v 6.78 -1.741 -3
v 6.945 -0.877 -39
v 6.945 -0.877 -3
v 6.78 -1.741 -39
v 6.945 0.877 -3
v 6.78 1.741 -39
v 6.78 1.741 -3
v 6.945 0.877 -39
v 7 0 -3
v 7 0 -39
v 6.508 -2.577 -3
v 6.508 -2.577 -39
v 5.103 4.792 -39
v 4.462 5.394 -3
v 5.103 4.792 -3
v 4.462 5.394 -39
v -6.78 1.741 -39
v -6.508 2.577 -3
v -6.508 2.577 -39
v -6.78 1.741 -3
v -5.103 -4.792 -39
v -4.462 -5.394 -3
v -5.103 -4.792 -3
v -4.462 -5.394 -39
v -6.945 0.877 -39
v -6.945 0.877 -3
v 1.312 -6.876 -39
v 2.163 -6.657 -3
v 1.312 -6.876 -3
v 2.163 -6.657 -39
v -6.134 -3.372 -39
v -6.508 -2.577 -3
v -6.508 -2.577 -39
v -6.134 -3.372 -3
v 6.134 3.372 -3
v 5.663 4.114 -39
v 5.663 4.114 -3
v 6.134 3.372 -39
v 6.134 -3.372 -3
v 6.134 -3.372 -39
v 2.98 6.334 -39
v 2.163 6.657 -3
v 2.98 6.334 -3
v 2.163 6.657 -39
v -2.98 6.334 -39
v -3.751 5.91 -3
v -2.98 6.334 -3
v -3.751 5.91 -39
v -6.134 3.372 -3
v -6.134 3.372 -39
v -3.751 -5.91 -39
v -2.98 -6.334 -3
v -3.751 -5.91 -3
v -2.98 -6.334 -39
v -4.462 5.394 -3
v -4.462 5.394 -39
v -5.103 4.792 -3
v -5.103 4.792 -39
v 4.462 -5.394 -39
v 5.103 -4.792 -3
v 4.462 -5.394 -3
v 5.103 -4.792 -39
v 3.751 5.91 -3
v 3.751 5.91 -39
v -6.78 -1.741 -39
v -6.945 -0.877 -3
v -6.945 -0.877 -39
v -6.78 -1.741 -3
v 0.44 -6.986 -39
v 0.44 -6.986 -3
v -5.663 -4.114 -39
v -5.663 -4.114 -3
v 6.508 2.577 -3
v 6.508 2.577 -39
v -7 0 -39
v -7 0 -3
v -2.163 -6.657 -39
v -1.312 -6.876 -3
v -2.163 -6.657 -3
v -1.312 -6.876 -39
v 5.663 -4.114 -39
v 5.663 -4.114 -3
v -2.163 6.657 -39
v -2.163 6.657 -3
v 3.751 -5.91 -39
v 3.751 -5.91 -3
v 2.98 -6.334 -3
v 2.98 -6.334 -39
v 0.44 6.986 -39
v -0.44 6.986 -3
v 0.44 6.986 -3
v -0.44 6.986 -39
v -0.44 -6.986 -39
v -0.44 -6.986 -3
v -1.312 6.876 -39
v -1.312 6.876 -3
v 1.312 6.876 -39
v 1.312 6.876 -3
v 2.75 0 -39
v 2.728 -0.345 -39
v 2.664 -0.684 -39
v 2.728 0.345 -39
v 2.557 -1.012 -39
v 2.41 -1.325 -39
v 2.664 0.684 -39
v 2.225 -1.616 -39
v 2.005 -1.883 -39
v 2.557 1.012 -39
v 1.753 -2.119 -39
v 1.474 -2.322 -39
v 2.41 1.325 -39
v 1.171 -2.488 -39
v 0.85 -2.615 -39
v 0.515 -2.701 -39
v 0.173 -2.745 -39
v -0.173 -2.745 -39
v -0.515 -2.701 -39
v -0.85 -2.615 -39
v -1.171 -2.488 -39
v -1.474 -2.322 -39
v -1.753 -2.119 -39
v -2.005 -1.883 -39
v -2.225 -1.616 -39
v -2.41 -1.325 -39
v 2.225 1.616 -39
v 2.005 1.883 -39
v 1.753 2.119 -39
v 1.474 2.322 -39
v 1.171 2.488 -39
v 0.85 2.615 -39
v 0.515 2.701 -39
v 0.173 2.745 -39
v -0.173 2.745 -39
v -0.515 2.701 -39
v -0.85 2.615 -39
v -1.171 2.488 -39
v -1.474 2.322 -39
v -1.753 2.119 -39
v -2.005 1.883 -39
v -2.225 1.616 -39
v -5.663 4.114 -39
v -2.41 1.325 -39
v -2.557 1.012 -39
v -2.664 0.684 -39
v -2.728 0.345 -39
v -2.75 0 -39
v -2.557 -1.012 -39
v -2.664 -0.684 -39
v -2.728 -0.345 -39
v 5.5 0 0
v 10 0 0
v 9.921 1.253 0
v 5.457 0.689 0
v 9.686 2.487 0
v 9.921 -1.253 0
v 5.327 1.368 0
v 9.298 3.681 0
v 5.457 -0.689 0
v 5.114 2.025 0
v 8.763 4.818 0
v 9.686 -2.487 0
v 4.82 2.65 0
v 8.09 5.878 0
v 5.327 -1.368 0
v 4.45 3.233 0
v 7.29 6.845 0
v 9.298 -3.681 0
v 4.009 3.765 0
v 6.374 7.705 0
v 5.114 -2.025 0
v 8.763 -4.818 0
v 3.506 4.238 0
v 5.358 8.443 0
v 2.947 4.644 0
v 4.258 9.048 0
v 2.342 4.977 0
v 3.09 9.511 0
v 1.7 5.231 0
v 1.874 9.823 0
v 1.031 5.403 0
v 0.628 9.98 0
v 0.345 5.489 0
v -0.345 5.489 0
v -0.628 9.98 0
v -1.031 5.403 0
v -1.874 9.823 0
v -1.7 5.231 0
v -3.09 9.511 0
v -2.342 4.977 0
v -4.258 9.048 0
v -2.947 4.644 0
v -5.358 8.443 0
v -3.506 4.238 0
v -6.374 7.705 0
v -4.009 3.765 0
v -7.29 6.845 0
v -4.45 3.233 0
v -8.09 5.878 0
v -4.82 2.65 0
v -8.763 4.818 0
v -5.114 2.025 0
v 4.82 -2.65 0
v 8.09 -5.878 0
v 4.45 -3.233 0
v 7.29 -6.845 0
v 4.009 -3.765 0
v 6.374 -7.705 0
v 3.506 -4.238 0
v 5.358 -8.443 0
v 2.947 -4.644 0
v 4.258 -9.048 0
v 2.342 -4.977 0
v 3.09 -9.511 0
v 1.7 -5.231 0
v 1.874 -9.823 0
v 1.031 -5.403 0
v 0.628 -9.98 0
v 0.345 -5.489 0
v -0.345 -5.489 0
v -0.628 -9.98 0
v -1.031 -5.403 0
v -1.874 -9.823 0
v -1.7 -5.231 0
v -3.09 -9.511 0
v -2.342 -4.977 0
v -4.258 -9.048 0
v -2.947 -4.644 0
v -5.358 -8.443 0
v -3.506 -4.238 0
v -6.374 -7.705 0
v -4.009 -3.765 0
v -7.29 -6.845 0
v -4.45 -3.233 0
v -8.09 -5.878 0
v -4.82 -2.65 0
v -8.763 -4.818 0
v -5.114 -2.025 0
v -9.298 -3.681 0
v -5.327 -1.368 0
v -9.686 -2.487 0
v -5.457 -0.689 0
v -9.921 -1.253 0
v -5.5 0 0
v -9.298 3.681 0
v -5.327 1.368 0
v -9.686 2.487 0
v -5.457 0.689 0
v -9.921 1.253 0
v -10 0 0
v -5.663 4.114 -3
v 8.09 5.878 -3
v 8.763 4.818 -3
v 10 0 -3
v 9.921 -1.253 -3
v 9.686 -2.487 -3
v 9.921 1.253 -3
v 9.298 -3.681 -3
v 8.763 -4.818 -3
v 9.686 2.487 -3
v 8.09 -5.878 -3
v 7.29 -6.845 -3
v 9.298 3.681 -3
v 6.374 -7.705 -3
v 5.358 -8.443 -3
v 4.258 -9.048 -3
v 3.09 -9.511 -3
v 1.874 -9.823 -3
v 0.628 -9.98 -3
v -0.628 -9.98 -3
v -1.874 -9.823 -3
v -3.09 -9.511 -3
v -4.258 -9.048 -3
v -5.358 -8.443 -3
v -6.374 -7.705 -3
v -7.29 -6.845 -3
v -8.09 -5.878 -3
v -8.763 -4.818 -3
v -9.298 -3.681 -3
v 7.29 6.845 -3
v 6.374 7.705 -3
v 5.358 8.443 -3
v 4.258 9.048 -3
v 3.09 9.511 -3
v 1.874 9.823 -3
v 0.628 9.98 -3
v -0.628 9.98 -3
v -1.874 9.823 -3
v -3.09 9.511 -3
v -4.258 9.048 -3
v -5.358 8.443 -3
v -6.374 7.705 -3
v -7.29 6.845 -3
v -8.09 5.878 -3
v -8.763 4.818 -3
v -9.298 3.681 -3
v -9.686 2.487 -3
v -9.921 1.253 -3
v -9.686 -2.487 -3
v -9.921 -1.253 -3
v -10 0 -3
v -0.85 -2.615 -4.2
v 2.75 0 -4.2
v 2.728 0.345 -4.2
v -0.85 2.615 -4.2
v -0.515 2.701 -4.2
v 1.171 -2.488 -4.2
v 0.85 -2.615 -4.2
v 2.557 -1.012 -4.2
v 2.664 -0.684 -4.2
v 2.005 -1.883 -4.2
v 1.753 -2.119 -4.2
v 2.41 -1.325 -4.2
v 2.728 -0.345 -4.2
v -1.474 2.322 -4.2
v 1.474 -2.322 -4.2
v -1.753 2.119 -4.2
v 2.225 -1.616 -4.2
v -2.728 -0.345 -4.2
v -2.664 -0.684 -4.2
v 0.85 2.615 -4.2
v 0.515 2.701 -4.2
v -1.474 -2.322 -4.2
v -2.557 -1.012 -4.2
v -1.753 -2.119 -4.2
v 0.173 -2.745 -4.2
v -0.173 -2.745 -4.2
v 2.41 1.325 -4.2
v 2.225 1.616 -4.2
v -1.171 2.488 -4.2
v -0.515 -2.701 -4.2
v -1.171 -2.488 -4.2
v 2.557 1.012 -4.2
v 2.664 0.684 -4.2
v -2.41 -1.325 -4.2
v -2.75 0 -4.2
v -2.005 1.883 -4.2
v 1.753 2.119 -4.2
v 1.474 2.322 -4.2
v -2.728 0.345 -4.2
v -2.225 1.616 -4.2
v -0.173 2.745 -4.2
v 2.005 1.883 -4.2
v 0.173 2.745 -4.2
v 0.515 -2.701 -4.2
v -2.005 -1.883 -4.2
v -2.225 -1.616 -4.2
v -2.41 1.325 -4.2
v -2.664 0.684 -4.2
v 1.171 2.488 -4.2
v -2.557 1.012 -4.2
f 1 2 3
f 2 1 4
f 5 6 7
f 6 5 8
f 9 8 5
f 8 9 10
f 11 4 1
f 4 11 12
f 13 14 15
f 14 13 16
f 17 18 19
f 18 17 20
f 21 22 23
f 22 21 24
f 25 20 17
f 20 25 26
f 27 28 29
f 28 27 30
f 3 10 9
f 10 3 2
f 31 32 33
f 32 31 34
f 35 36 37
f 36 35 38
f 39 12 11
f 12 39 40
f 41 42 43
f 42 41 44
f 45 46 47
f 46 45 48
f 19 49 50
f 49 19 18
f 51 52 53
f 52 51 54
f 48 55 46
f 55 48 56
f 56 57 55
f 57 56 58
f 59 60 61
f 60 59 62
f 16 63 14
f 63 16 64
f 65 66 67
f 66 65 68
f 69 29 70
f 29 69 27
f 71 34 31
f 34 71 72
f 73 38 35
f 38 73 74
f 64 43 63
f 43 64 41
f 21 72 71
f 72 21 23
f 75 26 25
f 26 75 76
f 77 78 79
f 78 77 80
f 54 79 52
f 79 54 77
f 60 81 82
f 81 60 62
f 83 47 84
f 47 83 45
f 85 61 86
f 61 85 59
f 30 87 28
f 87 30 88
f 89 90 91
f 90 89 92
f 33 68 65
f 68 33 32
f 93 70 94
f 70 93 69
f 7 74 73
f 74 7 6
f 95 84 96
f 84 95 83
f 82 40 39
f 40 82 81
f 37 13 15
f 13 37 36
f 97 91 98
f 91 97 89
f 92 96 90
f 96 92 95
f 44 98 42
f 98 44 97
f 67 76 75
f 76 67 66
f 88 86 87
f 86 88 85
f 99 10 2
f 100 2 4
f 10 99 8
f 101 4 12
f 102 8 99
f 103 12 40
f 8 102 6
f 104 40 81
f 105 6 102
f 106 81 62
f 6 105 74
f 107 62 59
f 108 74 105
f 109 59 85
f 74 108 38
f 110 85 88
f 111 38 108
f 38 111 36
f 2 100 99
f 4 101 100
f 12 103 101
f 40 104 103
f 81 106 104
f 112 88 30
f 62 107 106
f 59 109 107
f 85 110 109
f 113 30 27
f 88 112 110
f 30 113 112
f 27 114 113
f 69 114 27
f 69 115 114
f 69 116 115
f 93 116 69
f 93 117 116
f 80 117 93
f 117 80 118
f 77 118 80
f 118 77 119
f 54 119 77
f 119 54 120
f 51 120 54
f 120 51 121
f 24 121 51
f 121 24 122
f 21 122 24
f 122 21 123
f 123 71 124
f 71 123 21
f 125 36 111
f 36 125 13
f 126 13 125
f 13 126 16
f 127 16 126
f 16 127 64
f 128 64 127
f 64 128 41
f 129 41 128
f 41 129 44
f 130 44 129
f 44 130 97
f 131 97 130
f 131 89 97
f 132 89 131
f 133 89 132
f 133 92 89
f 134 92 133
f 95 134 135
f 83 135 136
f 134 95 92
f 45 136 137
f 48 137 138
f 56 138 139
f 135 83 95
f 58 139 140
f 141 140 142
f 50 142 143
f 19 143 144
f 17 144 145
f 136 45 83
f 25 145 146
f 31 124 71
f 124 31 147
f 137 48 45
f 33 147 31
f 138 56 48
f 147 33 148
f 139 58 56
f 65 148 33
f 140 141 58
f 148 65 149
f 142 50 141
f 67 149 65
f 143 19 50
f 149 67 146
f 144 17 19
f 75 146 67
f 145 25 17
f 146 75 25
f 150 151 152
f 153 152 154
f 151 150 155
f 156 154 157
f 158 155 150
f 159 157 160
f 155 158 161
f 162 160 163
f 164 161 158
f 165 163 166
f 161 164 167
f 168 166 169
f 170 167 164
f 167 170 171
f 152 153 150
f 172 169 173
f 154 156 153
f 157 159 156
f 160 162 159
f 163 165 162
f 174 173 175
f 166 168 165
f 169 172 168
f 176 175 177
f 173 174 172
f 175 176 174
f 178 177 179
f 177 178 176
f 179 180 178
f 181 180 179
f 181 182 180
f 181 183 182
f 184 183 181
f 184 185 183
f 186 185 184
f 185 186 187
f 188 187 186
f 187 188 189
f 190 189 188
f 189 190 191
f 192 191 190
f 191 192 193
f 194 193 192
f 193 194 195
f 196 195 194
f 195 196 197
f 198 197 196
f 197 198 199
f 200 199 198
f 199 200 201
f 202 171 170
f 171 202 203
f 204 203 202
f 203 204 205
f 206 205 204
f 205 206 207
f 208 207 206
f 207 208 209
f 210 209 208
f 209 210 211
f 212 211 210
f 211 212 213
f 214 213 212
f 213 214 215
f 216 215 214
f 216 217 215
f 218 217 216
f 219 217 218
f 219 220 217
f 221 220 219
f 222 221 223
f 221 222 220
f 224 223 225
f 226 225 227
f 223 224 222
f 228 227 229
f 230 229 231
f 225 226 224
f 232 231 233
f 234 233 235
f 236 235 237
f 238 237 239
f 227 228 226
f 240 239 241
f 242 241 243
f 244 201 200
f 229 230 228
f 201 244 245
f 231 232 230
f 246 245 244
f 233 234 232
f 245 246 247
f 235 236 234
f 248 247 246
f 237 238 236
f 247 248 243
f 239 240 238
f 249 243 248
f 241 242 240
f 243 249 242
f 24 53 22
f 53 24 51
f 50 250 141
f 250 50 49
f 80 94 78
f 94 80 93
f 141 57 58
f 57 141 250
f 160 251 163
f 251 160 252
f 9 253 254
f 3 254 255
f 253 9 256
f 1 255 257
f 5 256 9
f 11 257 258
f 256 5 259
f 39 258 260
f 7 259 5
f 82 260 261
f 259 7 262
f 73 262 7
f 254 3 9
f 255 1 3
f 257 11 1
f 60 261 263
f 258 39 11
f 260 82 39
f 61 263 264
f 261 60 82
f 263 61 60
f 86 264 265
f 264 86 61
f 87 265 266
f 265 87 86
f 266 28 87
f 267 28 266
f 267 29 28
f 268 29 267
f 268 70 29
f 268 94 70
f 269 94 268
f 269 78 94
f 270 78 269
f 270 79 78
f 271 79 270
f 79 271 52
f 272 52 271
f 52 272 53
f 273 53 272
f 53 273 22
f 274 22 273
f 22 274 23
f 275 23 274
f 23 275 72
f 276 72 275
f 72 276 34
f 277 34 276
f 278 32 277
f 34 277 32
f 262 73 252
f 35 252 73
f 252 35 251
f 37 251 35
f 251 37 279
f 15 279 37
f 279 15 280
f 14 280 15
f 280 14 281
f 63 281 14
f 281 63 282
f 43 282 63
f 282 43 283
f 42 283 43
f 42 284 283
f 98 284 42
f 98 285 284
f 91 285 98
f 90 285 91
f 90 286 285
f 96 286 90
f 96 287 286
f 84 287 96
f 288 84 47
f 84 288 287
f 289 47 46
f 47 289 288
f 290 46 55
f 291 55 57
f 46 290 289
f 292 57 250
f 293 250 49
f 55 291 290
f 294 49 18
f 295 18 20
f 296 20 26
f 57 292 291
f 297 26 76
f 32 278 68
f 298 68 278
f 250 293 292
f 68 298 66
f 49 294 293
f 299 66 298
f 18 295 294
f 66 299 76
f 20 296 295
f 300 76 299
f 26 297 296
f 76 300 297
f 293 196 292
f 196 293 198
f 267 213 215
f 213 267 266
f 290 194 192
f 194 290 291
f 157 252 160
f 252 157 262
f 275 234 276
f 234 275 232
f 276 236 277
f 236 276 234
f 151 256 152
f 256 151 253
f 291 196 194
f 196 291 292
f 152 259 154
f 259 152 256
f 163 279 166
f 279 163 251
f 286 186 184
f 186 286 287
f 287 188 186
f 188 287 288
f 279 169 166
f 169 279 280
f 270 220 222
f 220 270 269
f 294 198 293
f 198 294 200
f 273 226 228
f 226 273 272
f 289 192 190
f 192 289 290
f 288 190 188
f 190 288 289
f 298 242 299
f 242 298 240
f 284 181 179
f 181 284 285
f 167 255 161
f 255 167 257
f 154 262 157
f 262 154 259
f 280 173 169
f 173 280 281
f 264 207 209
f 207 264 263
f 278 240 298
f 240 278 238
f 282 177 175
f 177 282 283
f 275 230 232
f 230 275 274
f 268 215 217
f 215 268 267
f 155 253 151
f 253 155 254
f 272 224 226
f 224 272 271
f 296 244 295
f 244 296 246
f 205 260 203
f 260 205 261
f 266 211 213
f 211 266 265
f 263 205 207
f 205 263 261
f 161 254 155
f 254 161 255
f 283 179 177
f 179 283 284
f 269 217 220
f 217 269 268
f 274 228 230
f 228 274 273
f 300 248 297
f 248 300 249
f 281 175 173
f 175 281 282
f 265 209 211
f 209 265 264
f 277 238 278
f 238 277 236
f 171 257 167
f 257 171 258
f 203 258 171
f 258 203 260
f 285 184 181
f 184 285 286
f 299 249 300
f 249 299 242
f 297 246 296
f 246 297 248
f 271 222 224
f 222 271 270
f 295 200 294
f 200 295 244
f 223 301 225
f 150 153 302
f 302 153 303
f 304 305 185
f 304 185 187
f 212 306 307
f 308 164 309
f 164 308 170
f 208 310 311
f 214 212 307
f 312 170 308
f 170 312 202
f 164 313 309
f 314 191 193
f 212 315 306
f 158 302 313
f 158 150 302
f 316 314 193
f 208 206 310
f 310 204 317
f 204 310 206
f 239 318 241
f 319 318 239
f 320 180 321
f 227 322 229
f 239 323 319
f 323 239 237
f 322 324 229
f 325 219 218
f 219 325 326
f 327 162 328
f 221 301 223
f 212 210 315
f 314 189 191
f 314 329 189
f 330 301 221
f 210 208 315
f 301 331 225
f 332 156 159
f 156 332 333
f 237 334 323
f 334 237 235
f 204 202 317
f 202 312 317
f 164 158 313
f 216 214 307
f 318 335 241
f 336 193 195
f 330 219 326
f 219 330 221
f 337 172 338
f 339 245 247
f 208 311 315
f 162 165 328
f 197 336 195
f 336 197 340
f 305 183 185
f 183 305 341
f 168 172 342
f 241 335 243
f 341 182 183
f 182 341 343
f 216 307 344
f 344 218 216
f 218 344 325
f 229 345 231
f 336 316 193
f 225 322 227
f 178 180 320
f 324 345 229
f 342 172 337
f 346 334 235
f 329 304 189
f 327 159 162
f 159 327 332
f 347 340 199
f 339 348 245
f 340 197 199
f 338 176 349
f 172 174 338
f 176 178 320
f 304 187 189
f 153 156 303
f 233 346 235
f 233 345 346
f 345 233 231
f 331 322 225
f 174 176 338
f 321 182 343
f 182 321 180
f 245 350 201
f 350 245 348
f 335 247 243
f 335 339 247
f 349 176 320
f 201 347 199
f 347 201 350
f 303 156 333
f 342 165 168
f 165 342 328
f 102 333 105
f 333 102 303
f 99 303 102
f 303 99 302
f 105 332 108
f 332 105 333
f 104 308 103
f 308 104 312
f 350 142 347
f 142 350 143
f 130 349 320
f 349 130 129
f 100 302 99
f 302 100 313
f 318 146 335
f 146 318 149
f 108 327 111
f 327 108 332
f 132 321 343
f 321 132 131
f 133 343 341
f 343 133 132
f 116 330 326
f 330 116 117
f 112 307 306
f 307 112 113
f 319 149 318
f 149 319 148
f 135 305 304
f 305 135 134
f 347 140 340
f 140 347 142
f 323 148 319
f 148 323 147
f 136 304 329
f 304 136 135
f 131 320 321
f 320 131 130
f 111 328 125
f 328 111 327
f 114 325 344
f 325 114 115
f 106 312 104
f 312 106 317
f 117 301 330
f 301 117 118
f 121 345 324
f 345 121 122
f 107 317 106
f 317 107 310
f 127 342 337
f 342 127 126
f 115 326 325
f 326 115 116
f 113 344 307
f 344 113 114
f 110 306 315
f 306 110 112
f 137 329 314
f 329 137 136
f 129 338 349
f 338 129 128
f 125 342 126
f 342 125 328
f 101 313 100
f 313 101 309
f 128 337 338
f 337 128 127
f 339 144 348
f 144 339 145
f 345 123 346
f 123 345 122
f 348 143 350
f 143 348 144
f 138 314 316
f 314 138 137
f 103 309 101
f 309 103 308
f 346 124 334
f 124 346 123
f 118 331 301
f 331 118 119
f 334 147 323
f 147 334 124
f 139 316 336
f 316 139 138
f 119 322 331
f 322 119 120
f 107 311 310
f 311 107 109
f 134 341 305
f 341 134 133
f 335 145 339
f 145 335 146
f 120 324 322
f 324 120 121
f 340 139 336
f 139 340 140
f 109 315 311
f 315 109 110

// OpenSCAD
$fn = 50;


difference() {
	union() {
		translate(v = [0, 0, -39.0000000000]) {
			cylinder(h = 39, r = 7.0000000000);
		}
		translate(v = [0, 0, -3.0000000000]) {
			cylinder(h = 3, r = 10.0000000000);
		}
	}
	union() {
		translate(v = [0, 0, 0]) {
			rotate(a = [0, 0, 0]) {
				difference() {
					union() {
						#translate(v = [0, 0, -39.0000000000]) {
							cylinder(h = 39, r = 2.2500000000);
						}
						#translate(v = [0, 0, -4.2000000000]) {
							cylinder(h = 4.2000000000, r = 7.0000000000, r1 = 2.7500000000, r2 = 5.5000000000);
						}
						#translate(v = [0, 0, -39.0000000000]) {
							cylinder(h = 39, r = 2.7500000000);
						}
						#translate(v = [0, 0, -39.0000000000]) {
							cylinder(h = 39, r = 2.2500000000);
						}
					}
					union();
				}
			}
		}
	}
}
